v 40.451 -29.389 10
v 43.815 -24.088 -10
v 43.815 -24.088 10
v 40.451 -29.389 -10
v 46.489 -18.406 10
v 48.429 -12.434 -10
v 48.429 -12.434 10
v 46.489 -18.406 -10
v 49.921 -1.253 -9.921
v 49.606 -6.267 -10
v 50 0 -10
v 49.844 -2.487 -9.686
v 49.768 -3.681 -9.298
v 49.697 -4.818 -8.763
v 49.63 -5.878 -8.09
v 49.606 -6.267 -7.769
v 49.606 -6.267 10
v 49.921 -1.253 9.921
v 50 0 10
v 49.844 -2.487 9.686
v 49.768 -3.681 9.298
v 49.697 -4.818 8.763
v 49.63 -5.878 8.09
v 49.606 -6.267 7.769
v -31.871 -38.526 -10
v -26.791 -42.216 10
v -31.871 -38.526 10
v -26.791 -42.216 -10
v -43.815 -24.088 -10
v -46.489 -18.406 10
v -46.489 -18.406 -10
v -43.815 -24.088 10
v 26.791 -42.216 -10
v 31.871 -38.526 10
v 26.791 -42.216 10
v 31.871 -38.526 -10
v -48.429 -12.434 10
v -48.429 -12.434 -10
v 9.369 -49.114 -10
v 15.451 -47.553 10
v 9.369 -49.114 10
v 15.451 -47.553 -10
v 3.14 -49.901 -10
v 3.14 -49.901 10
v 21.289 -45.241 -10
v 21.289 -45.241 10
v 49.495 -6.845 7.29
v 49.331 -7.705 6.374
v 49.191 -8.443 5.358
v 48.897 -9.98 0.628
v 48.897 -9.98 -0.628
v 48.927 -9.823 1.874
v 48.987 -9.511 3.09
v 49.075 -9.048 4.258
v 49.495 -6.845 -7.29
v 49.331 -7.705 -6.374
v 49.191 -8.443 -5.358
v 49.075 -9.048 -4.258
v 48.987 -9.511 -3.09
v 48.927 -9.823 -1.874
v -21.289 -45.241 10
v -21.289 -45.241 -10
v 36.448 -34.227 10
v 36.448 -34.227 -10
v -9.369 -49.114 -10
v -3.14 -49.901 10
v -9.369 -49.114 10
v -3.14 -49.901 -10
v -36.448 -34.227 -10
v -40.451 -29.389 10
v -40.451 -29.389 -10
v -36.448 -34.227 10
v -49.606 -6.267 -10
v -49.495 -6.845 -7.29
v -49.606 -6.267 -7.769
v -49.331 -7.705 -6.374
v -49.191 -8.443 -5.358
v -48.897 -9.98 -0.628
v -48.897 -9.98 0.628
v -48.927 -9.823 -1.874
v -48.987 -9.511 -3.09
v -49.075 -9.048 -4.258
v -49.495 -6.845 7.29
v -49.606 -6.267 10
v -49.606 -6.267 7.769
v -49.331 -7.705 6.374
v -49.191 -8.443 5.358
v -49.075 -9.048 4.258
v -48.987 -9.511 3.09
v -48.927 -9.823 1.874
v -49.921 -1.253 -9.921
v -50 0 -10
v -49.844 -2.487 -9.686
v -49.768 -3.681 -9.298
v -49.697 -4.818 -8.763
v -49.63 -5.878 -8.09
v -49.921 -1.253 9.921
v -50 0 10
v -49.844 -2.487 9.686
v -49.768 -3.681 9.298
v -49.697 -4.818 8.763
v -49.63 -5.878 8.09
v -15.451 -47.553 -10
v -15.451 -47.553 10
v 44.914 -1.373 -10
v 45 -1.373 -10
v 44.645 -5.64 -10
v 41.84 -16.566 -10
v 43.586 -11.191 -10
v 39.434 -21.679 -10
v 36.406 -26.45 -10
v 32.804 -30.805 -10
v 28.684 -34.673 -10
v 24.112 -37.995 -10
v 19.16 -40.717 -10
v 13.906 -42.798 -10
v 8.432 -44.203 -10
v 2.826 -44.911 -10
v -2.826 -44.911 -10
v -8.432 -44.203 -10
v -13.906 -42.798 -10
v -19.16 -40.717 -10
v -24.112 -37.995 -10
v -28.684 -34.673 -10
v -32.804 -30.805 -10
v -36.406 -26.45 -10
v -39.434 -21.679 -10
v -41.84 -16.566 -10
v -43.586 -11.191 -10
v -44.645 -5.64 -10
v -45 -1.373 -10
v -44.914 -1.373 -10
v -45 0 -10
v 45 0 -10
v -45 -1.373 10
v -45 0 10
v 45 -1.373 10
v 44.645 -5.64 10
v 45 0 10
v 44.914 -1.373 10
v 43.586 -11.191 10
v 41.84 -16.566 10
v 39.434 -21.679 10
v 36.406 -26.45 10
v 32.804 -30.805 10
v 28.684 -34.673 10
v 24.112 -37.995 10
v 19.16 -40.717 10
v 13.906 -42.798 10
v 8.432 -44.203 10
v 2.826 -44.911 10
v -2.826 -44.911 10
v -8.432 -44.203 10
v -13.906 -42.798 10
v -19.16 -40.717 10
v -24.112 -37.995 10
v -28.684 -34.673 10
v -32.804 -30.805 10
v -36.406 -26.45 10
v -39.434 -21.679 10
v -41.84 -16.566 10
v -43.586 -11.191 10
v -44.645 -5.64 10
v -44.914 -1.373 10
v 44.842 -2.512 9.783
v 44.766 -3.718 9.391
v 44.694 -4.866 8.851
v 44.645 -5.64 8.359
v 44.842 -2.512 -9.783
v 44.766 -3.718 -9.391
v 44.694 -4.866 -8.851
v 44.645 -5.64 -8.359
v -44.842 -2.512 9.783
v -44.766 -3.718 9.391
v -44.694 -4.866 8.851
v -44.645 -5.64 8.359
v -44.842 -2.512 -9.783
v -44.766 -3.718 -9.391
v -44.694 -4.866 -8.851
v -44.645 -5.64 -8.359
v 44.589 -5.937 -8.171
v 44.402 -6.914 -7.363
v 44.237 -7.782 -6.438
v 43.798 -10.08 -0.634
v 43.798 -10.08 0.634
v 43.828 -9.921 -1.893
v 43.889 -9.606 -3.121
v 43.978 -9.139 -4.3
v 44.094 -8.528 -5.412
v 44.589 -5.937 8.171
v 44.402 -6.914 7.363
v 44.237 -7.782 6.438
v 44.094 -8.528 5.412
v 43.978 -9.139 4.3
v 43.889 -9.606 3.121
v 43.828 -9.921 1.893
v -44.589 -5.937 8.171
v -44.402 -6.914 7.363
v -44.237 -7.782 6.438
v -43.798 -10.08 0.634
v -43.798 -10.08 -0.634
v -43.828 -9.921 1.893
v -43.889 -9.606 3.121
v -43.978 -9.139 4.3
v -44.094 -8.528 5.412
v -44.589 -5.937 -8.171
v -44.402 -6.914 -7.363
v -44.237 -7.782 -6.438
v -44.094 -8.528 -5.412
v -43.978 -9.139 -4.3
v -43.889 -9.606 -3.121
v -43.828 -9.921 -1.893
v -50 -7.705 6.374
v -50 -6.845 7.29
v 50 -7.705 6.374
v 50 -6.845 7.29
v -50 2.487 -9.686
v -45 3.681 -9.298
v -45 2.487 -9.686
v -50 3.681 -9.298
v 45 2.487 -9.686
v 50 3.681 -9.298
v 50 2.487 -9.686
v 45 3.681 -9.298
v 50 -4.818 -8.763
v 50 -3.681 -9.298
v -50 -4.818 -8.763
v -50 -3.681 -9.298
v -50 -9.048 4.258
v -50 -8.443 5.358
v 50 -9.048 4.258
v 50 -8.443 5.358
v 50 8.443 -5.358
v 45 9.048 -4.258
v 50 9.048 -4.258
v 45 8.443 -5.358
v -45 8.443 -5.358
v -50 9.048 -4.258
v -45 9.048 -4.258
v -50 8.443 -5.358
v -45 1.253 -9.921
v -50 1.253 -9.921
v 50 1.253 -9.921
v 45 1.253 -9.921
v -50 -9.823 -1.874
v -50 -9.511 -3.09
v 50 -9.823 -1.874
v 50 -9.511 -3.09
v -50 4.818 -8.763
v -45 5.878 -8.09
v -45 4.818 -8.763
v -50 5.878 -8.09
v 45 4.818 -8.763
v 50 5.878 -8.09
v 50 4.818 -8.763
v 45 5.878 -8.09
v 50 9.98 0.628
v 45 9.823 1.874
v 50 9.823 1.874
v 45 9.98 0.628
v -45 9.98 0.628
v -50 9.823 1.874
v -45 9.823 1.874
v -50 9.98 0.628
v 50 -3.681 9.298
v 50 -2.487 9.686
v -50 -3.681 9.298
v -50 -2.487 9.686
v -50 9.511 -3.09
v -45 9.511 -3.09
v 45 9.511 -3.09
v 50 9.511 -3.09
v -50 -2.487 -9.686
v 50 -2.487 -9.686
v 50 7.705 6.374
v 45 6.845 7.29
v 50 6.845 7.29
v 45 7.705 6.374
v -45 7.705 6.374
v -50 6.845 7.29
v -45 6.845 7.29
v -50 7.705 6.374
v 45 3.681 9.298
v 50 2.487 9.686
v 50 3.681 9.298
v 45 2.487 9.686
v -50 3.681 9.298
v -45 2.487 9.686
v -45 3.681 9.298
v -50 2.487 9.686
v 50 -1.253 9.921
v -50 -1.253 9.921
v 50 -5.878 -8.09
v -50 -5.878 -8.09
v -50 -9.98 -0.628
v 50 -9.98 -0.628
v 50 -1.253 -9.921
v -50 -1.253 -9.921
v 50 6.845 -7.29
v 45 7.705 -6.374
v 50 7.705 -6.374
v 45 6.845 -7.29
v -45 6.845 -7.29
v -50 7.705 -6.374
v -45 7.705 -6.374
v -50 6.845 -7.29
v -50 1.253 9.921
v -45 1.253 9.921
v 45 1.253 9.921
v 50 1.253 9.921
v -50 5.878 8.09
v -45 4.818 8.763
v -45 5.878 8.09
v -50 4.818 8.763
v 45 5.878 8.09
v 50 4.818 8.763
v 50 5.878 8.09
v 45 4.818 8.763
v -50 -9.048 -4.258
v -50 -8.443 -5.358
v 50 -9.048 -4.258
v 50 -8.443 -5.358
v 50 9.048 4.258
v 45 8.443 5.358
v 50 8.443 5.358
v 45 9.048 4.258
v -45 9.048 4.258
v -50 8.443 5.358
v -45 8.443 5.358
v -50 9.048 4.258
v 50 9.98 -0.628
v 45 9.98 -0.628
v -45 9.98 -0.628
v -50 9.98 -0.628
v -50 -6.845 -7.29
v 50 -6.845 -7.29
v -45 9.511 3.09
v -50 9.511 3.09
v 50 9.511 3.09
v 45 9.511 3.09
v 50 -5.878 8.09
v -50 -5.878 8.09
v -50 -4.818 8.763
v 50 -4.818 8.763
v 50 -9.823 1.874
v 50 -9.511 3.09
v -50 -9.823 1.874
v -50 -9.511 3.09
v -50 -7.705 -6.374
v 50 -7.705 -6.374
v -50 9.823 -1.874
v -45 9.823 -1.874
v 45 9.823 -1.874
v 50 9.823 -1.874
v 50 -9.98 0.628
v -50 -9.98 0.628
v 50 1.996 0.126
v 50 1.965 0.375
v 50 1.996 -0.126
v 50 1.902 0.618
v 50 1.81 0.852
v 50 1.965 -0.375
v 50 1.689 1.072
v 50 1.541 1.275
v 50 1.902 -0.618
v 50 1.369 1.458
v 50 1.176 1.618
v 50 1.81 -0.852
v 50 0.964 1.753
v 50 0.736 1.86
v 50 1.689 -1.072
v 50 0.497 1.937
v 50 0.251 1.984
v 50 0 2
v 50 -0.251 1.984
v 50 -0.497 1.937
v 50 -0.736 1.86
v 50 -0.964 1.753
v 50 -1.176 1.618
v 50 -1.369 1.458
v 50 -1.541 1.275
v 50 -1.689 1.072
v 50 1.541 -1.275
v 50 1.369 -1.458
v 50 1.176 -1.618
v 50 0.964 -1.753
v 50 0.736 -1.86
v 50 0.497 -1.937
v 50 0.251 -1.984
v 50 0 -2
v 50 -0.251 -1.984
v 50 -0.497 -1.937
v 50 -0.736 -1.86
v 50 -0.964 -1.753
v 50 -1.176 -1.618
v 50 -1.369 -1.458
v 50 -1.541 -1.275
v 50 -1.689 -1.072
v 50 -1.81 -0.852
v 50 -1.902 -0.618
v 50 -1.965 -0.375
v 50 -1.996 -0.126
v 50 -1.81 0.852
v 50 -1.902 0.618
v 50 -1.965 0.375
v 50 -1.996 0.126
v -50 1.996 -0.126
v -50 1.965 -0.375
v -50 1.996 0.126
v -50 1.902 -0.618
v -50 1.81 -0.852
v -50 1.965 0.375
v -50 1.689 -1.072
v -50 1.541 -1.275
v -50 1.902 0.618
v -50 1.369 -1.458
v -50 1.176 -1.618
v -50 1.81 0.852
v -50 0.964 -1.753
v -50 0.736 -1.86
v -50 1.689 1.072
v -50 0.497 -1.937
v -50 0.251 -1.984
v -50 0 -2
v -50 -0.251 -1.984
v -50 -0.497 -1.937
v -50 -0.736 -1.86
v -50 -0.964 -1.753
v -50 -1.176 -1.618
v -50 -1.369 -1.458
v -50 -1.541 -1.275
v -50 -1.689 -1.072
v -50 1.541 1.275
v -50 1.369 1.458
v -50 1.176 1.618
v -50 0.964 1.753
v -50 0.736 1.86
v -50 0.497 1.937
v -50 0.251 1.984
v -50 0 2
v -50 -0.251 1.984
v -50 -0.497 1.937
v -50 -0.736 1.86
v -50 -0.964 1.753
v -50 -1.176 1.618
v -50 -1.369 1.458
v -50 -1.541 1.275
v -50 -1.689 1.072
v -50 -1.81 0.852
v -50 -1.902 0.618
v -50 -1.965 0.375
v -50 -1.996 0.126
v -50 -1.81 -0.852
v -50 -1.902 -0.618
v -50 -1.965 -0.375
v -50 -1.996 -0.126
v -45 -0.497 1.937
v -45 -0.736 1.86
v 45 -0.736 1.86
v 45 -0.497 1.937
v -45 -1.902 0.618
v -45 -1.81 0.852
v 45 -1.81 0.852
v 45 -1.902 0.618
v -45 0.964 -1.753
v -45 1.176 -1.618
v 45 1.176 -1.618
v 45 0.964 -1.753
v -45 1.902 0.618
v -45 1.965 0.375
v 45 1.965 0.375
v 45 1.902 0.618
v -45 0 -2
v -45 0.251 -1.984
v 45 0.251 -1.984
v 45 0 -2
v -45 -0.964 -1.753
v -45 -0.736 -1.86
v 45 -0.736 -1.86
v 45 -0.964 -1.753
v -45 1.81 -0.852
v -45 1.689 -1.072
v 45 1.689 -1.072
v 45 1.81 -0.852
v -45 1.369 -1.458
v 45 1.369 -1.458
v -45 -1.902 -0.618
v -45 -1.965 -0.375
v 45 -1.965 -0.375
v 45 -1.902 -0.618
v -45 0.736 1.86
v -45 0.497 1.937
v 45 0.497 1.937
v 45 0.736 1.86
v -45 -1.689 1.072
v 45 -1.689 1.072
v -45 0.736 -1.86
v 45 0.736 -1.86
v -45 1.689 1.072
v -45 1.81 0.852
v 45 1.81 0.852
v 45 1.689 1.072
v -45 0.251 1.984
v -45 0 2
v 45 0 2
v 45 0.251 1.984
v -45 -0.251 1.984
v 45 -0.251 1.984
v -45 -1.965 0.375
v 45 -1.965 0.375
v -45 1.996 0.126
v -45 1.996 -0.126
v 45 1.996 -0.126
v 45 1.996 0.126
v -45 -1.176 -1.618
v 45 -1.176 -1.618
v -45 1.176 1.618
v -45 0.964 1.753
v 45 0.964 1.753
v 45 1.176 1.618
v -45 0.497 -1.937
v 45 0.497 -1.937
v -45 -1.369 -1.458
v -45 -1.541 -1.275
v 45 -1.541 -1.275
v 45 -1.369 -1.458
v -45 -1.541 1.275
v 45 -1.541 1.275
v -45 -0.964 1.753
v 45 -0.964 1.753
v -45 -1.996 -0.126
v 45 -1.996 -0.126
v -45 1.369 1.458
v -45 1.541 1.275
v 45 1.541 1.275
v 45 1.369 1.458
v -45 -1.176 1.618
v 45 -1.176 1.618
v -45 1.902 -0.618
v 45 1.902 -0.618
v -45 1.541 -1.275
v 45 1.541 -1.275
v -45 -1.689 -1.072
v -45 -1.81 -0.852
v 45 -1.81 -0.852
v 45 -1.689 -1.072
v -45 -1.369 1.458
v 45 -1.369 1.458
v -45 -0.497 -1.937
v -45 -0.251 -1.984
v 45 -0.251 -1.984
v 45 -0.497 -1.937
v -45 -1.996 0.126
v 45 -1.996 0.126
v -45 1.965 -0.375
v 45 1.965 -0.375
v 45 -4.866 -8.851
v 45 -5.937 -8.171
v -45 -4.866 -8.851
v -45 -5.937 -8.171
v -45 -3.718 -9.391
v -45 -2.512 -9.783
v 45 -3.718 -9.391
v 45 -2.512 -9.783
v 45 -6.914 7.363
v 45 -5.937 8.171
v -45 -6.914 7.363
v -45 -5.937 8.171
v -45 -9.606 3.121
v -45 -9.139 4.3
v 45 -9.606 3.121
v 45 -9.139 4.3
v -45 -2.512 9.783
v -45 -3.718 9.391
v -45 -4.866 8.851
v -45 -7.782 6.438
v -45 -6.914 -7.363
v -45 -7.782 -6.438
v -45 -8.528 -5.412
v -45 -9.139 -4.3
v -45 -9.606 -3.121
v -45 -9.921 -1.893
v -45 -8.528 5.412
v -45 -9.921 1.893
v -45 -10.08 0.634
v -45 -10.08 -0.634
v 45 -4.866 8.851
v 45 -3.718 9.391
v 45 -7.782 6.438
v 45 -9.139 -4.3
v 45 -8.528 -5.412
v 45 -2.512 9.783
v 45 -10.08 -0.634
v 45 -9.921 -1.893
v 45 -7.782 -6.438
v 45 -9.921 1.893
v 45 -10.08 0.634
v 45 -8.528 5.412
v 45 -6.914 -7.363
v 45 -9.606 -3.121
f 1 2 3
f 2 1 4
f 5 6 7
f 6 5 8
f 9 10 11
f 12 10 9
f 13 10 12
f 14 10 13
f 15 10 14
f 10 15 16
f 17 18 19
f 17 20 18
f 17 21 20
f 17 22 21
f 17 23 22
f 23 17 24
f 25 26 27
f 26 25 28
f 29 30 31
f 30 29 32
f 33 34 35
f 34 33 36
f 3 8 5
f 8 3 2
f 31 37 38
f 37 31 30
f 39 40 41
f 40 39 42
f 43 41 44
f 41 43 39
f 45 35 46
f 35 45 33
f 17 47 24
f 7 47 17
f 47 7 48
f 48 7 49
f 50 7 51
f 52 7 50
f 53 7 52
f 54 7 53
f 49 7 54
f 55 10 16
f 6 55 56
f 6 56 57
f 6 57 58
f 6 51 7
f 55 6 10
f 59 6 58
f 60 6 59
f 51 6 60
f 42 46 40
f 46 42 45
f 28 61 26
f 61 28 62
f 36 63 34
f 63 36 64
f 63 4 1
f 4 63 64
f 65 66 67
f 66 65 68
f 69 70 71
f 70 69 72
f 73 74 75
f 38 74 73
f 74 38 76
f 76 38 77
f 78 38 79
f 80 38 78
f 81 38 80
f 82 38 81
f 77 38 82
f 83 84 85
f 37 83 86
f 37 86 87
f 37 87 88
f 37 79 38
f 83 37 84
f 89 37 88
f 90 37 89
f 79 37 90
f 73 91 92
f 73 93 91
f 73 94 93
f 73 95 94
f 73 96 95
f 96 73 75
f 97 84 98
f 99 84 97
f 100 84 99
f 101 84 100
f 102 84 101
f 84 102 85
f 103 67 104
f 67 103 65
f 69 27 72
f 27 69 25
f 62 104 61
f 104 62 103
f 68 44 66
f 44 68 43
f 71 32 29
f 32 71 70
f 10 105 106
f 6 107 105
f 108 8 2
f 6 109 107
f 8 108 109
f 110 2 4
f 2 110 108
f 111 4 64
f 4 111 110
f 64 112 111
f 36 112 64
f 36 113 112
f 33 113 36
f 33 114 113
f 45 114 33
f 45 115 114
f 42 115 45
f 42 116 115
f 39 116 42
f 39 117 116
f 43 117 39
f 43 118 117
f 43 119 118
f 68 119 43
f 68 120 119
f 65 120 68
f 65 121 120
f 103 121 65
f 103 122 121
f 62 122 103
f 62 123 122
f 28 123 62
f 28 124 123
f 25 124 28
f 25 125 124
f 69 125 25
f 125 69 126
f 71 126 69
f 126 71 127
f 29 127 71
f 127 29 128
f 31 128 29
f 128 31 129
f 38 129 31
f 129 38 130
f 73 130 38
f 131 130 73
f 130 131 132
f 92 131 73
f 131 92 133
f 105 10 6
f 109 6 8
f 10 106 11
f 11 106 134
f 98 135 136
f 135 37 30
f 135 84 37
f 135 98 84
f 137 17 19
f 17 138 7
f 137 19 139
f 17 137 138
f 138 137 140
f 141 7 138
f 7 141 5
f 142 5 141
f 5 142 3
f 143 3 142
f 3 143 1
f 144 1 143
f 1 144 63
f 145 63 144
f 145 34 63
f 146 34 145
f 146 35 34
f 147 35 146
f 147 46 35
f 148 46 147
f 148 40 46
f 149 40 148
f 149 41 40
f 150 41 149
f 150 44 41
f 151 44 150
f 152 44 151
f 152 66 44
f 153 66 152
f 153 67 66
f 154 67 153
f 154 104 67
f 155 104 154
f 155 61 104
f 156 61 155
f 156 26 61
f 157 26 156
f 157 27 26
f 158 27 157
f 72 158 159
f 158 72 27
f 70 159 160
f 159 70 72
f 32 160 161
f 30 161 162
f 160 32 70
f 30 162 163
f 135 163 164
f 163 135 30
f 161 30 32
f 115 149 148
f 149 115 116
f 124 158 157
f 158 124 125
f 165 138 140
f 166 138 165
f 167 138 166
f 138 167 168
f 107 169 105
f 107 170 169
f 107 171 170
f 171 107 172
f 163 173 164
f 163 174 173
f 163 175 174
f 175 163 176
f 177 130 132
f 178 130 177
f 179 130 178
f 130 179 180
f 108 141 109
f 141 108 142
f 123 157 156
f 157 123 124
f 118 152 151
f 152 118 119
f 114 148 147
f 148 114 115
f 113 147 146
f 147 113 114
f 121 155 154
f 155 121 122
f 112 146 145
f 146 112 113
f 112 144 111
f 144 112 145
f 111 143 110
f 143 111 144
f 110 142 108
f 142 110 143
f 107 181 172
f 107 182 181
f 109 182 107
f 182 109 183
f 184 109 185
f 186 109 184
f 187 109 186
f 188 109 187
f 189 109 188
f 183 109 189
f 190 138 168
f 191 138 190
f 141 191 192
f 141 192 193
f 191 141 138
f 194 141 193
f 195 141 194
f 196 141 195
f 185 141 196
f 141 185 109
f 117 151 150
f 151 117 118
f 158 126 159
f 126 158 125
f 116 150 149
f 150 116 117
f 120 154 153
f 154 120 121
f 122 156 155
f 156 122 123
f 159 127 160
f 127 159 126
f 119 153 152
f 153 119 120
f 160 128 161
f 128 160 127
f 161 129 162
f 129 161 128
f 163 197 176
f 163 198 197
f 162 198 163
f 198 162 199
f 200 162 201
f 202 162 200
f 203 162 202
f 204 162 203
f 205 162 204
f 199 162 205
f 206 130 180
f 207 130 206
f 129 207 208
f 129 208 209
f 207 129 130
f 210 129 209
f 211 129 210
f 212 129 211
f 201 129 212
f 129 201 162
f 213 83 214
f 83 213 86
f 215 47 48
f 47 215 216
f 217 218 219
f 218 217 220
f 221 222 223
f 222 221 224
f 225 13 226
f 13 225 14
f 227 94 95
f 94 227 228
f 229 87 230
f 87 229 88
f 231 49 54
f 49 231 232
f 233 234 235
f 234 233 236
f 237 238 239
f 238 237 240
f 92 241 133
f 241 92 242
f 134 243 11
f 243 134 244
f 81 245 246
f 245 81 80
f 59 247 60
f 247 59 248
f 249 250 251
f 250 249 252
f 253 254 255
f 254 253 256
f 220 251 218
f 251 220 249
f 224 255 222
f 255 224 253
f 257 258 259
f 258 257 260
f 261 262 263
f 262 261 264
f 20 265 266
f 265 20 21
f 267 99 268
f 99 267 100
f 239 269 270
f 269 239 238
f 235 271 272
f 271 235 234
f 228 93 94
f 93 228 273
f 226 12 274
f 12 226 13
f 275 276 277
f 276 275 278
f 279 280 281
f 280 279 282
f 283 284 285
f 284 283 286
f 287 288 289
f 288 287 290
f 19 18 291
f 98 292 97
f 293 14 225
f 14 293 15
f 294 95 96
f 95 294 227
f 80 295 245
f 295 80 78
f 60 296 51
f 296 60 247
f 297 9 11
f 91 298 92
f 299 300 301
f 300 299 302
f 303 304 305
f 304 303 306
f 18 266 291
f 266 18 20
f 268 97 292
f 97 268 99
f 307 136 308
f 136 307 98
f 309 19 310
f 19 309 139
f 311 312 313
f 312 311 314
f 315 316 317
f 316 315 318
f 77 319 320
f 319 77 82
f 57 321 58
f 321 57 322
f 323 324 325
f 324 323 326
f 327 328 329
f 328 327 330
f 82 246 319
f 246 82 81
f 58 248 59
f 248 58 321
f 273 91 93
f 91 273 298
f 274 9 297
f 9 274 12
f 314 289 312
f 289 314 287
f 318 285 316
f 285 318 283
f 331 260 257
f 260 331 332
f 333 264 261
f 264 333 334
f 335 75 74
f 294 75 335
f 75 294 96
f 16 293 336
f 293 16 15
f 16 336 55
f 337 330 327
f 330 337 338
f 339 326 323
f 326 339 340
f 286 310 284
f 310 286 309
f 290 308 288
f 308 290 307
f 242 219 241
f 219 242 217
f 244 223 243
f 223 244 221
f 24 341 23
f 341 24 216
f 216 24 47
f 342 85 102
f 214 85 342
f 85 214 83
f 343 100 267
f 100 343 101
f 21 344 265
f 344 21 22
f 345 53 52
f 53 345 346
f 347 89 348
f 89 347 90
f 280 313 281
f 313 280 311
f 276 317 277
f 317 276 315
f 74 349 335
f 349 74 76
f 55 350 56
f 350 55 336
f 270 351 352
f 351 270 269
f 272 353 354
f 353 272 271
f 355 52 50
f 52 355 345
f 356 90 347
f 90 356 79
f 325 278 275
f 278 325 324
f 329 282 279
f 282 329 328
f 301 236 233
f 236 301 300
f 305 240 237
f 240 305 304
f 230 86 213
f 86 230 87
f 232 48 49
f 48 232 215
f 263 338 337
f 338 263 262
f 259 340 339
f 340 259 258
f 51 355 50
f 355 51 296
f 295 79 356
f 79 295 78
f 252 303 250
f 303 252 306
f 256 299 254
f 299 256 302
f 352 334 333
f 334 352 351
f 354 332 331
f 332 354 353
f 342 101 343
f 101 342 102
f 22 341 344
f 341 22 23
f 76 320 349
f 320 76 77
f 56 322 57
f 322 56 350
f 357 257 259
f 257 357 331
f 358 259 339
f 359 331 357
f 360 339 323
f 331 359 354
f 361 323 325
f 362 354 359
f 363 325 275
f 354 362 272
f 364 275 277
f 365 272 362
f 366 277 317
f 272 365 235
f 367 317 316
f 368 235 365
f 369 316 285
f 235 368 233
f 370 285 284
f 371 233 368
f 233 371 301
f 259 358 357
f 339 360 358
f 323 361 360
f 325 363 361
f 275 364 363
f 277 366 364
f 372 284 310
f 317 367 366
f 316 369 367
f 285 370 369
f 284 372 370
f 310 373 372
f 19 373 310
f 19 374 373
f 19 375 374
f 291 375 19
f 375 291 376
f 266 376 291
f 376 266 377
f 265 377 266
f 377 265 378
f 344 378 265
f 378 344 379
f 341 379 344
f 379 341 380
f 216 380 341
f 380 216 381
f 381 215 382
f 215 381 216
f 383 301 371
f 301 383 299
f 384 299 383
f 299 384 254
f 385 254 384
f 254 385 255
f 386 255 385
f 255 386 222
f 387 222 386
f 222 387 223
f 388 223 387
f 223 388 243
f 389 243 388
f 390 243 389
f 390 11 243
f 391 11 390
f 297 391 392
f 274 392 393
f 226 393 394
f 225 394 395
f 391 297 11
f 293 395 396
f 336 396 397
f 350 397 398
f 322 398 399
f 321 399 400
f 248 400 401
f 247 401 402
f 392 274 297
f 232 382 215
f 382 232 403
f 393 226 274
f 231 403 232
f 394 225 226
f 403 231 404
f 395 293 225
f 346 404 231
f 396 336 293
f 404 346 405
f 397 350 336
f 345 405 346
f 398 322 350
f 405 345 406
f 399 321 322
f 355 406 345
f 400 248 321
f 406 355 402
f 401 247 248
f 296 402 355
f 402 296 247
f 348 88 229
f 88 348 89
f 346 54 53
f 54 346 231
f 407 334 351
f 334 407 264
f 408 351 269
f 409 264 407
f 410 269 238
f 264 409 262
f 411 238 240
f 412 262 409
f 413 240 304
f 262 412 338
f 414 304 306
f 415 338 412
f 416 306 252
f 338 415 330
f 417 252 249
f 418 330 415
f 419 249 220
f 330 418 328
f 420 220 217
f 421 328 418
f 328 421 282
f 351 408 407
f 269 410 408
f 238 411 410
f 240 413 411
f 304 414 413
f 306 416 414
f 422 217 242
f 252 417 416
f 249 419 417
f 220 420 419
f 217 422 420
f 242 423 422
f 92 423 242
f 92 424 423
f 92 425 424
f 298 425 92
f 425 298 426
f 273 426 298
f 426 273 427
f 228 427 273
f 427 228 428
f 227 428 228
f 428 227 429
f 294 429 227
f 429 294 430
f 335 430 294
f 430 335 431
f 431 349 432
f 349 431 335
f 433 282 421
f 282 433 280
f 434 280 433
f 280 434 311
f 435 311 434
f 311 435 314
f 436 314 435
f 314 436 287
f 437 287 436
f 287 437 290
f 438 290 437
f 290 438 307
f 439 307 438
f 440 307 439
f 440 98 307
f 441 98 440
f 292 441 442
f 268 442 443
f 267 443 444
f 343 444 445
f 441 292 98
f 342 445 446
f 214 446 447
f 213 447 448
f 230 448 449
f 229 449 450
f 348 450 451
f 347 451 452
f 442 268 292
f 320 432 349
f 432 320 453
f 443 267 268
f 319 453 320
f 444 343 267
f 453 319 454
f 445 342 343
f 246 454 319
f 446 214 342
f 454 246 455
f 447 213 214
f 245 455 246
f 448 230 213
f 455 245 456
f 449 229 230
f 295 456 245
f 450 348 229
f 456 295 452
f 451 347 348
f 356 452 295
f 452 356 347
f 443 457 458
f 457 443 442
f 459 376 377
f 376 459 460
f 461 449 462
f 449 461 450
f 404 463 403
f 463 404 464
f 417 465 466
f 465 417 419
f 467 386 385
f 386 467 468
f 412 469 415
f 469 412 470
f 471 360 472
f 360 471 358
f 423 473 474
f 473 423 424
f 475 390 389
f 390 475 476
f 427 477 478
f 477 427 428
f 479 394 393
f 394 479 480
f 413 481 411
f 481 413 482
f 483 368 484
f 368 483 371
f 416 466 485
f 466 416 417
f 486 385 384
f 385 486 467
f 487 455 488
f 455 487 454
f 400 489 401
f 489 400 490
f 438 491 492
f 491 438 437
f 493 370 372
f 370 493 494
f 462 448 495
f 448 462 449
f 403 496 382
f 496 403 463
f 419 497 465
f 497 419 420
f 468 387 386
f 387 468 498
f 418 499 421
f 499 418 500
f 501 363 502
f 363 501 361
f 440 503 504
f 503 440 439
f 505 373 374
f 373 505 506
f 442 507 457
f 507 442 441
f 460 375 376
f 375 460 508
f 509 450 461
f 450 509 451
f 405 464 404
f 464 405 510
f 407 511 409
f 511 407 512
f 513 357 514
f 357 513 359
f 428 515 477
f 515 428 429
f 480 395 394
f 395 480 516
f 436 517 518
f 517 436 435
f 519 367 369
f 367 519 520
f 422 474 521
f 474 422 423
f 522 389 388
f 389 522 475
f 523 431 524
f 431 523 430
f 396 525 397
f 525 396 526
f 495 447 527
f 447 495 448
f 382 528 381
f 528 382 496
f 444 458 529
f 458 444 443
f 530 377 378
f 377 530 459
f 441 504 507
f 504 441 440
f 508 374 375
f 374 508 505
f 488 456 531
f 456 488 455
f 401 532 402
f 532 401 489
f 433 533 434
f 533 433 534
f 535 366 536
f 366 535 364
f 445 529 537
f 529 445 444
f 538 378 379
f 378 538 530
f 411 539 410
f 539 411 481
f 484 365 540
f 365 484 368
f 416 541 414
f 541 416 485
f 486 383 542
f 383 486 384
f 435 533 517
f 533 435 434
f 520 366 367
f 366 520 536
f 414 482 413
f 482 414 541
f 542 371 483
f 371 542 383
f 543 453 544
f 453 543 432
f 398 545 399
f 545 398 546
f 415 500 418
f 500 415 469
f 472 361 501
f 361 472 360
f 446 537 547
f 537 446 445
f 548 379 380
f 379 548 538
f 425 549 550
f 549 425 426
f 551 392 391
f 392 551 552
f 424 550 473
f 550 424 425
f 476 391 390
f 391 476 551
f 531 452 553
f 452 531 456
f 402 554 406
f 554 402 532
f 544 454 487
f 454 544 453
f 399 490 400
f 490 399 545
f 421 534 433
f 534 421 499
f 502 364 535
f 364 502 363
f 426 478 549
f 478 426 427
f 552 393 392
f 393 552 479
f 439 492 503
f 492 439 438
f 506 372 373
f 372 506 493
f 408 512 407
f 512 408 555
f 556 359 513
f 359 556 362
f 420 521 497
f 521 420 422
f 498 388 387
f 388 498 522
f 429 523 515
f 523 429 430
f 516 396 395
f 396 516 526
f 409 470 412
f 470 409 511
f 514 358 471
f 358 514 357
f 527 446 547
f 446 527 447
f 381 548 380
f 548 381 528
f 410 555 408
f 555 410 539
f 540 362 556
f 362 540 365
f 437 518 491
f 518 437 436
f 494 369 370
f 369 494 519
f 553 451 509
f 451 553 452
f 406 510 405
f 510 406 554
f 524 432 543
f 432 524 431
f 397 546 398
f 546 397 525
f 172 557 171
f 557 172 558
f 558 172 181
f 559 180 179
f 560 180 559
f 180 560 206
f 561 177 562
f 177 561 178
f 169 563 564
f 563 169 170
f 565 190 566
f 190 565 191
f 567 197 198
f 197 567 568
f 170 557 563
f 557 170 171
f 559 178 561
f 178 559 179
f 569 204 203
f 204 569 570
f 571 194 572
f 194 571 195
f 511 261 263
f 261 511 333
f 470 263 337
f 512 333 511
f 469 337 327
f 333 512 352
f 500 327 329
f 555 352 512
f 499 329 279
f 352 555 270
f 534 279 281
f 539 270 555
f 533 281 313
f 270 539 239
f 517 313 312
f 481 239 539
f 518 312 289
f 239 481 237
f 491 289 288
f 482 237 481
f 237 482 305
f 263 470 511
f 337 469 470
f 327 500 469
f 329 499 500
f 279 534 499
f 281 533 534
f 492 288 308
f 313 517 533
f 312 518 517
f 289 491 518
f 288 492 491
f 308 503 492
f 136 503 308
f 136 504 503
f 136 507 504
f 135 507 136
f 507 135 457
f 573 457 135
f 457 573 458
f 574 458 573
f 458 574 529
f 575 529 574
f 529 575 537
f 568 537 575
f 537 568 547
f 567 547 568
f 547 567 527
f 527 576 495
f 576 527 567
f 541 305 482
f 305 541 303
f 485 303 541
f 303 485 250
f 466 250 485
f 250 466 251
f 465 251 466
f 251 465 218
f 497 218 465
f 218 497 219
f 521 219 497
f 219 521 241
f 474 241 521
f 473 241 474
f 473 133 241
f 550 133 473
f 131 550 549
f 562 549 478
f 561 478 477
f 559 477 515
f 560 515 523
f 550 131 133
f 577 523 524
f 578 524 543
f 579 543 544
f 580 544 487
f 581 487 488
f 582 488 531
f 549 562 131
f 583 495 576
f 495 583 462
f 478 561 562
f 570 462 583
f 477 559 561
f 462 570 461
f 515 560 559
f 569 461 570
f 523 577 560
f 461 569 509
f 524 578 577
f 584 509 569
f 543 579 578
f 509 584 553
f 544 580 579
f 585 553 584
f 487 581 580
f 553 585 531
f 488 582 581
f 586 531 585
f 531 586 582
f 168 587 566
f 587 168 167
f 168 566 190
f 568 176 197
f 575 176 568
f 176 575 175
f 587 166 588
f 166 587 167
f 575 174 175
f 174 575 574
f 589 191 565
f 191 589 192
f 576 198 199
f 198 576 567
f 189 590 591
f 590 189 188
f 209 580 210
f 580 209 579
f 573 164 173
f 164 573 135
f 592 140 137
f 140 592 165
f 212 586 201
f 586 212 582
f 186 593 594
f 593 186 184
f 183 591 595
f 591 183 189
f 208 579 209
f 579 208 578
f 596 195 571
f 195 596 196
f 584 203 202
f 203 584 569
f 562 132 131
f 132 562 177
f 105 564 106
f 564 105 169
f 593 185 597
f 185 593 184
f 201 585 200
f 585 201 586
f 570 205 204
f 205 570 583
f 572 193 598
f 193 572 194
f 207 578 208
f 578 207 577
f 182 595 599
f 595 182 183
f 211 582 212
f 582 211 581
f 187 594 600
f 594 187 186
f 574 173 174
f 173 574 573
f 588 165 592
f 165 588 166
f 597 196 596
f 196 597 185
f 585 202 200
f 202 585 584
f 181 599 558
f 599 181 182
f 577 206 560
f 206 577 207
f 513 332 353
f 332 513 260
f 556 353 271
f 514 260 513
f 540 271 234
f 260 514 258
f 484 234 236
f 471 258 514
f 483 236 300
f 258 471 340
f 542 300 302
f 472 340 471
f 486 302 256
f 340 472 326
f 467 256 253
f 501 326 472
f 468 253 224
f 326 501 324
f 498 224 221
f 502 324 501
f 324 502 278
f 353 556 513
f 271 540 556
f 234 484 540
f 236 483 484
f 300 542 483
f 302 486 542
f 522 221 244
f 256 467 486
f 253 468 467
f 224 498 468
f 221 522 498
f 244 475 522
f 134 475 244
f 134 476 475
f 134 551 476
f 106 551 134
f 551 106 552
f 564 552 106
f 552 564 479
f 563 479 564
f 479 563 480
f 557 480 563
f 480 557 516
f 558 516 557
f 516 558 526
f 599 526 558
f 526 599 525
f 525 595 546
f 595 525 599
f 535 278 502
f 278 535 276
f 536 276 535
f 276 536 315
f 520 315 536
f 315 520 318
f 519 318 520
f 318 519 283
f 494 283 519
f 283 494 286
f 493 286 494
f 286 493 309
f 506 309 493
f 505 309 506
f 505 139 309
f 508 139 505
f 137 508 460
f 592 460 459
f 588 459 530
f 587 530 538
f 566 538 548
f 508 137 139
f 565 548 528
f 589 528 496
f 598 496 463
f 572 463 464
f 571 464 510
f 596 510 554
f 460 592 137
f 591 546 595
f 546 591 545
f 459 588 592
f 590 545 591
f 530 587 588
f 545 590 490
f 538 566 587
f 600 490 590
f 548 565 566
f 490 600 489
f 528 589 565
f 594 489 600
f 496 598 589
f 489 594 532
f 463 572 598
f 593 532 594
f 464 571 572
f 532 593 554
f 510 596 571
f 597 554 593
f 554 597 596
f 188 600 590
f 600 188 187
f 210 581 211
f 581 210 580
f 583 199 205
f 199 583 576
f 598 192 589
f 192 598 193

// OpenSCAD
//Customizable Shadow Band - to cast a shadow on solar radiation equipment so you can look at global and direct radiation


//Height of band
h=20; 
// radius of band
r=50; 
//Thickness of band
t= 5; 
// Center extension width
w=10; 
//Center extension hole size
e=2;

module shadowband ()
{
difference(){

		union(){
		rotate([0,90,0])cylinder(h = 2*r, r1 = w, r2 = w, center = true, $fn=50);
			difference(){
			cylinder(h = h, r1 = r, r2 = r, center = true, $fn=50);
			cylinder(h = h+2, r1 = r-t, r2 = r-t, center = true, $fn=50);
			translate([-r,0,-h/2-1])cube([2*r+2,r+1,h+2]);
						}
				}
rotate([0,90,0])cylinder(h = 2*r+2, r1 = e, r2 = e, center = true, $fn=50);
rotate([0,90,0])cylinder(h = 2*r-2*t, r1 = w+0.1, r2 = w+0.1, center = true, $fn=50);
			}
}

shadowband ();
